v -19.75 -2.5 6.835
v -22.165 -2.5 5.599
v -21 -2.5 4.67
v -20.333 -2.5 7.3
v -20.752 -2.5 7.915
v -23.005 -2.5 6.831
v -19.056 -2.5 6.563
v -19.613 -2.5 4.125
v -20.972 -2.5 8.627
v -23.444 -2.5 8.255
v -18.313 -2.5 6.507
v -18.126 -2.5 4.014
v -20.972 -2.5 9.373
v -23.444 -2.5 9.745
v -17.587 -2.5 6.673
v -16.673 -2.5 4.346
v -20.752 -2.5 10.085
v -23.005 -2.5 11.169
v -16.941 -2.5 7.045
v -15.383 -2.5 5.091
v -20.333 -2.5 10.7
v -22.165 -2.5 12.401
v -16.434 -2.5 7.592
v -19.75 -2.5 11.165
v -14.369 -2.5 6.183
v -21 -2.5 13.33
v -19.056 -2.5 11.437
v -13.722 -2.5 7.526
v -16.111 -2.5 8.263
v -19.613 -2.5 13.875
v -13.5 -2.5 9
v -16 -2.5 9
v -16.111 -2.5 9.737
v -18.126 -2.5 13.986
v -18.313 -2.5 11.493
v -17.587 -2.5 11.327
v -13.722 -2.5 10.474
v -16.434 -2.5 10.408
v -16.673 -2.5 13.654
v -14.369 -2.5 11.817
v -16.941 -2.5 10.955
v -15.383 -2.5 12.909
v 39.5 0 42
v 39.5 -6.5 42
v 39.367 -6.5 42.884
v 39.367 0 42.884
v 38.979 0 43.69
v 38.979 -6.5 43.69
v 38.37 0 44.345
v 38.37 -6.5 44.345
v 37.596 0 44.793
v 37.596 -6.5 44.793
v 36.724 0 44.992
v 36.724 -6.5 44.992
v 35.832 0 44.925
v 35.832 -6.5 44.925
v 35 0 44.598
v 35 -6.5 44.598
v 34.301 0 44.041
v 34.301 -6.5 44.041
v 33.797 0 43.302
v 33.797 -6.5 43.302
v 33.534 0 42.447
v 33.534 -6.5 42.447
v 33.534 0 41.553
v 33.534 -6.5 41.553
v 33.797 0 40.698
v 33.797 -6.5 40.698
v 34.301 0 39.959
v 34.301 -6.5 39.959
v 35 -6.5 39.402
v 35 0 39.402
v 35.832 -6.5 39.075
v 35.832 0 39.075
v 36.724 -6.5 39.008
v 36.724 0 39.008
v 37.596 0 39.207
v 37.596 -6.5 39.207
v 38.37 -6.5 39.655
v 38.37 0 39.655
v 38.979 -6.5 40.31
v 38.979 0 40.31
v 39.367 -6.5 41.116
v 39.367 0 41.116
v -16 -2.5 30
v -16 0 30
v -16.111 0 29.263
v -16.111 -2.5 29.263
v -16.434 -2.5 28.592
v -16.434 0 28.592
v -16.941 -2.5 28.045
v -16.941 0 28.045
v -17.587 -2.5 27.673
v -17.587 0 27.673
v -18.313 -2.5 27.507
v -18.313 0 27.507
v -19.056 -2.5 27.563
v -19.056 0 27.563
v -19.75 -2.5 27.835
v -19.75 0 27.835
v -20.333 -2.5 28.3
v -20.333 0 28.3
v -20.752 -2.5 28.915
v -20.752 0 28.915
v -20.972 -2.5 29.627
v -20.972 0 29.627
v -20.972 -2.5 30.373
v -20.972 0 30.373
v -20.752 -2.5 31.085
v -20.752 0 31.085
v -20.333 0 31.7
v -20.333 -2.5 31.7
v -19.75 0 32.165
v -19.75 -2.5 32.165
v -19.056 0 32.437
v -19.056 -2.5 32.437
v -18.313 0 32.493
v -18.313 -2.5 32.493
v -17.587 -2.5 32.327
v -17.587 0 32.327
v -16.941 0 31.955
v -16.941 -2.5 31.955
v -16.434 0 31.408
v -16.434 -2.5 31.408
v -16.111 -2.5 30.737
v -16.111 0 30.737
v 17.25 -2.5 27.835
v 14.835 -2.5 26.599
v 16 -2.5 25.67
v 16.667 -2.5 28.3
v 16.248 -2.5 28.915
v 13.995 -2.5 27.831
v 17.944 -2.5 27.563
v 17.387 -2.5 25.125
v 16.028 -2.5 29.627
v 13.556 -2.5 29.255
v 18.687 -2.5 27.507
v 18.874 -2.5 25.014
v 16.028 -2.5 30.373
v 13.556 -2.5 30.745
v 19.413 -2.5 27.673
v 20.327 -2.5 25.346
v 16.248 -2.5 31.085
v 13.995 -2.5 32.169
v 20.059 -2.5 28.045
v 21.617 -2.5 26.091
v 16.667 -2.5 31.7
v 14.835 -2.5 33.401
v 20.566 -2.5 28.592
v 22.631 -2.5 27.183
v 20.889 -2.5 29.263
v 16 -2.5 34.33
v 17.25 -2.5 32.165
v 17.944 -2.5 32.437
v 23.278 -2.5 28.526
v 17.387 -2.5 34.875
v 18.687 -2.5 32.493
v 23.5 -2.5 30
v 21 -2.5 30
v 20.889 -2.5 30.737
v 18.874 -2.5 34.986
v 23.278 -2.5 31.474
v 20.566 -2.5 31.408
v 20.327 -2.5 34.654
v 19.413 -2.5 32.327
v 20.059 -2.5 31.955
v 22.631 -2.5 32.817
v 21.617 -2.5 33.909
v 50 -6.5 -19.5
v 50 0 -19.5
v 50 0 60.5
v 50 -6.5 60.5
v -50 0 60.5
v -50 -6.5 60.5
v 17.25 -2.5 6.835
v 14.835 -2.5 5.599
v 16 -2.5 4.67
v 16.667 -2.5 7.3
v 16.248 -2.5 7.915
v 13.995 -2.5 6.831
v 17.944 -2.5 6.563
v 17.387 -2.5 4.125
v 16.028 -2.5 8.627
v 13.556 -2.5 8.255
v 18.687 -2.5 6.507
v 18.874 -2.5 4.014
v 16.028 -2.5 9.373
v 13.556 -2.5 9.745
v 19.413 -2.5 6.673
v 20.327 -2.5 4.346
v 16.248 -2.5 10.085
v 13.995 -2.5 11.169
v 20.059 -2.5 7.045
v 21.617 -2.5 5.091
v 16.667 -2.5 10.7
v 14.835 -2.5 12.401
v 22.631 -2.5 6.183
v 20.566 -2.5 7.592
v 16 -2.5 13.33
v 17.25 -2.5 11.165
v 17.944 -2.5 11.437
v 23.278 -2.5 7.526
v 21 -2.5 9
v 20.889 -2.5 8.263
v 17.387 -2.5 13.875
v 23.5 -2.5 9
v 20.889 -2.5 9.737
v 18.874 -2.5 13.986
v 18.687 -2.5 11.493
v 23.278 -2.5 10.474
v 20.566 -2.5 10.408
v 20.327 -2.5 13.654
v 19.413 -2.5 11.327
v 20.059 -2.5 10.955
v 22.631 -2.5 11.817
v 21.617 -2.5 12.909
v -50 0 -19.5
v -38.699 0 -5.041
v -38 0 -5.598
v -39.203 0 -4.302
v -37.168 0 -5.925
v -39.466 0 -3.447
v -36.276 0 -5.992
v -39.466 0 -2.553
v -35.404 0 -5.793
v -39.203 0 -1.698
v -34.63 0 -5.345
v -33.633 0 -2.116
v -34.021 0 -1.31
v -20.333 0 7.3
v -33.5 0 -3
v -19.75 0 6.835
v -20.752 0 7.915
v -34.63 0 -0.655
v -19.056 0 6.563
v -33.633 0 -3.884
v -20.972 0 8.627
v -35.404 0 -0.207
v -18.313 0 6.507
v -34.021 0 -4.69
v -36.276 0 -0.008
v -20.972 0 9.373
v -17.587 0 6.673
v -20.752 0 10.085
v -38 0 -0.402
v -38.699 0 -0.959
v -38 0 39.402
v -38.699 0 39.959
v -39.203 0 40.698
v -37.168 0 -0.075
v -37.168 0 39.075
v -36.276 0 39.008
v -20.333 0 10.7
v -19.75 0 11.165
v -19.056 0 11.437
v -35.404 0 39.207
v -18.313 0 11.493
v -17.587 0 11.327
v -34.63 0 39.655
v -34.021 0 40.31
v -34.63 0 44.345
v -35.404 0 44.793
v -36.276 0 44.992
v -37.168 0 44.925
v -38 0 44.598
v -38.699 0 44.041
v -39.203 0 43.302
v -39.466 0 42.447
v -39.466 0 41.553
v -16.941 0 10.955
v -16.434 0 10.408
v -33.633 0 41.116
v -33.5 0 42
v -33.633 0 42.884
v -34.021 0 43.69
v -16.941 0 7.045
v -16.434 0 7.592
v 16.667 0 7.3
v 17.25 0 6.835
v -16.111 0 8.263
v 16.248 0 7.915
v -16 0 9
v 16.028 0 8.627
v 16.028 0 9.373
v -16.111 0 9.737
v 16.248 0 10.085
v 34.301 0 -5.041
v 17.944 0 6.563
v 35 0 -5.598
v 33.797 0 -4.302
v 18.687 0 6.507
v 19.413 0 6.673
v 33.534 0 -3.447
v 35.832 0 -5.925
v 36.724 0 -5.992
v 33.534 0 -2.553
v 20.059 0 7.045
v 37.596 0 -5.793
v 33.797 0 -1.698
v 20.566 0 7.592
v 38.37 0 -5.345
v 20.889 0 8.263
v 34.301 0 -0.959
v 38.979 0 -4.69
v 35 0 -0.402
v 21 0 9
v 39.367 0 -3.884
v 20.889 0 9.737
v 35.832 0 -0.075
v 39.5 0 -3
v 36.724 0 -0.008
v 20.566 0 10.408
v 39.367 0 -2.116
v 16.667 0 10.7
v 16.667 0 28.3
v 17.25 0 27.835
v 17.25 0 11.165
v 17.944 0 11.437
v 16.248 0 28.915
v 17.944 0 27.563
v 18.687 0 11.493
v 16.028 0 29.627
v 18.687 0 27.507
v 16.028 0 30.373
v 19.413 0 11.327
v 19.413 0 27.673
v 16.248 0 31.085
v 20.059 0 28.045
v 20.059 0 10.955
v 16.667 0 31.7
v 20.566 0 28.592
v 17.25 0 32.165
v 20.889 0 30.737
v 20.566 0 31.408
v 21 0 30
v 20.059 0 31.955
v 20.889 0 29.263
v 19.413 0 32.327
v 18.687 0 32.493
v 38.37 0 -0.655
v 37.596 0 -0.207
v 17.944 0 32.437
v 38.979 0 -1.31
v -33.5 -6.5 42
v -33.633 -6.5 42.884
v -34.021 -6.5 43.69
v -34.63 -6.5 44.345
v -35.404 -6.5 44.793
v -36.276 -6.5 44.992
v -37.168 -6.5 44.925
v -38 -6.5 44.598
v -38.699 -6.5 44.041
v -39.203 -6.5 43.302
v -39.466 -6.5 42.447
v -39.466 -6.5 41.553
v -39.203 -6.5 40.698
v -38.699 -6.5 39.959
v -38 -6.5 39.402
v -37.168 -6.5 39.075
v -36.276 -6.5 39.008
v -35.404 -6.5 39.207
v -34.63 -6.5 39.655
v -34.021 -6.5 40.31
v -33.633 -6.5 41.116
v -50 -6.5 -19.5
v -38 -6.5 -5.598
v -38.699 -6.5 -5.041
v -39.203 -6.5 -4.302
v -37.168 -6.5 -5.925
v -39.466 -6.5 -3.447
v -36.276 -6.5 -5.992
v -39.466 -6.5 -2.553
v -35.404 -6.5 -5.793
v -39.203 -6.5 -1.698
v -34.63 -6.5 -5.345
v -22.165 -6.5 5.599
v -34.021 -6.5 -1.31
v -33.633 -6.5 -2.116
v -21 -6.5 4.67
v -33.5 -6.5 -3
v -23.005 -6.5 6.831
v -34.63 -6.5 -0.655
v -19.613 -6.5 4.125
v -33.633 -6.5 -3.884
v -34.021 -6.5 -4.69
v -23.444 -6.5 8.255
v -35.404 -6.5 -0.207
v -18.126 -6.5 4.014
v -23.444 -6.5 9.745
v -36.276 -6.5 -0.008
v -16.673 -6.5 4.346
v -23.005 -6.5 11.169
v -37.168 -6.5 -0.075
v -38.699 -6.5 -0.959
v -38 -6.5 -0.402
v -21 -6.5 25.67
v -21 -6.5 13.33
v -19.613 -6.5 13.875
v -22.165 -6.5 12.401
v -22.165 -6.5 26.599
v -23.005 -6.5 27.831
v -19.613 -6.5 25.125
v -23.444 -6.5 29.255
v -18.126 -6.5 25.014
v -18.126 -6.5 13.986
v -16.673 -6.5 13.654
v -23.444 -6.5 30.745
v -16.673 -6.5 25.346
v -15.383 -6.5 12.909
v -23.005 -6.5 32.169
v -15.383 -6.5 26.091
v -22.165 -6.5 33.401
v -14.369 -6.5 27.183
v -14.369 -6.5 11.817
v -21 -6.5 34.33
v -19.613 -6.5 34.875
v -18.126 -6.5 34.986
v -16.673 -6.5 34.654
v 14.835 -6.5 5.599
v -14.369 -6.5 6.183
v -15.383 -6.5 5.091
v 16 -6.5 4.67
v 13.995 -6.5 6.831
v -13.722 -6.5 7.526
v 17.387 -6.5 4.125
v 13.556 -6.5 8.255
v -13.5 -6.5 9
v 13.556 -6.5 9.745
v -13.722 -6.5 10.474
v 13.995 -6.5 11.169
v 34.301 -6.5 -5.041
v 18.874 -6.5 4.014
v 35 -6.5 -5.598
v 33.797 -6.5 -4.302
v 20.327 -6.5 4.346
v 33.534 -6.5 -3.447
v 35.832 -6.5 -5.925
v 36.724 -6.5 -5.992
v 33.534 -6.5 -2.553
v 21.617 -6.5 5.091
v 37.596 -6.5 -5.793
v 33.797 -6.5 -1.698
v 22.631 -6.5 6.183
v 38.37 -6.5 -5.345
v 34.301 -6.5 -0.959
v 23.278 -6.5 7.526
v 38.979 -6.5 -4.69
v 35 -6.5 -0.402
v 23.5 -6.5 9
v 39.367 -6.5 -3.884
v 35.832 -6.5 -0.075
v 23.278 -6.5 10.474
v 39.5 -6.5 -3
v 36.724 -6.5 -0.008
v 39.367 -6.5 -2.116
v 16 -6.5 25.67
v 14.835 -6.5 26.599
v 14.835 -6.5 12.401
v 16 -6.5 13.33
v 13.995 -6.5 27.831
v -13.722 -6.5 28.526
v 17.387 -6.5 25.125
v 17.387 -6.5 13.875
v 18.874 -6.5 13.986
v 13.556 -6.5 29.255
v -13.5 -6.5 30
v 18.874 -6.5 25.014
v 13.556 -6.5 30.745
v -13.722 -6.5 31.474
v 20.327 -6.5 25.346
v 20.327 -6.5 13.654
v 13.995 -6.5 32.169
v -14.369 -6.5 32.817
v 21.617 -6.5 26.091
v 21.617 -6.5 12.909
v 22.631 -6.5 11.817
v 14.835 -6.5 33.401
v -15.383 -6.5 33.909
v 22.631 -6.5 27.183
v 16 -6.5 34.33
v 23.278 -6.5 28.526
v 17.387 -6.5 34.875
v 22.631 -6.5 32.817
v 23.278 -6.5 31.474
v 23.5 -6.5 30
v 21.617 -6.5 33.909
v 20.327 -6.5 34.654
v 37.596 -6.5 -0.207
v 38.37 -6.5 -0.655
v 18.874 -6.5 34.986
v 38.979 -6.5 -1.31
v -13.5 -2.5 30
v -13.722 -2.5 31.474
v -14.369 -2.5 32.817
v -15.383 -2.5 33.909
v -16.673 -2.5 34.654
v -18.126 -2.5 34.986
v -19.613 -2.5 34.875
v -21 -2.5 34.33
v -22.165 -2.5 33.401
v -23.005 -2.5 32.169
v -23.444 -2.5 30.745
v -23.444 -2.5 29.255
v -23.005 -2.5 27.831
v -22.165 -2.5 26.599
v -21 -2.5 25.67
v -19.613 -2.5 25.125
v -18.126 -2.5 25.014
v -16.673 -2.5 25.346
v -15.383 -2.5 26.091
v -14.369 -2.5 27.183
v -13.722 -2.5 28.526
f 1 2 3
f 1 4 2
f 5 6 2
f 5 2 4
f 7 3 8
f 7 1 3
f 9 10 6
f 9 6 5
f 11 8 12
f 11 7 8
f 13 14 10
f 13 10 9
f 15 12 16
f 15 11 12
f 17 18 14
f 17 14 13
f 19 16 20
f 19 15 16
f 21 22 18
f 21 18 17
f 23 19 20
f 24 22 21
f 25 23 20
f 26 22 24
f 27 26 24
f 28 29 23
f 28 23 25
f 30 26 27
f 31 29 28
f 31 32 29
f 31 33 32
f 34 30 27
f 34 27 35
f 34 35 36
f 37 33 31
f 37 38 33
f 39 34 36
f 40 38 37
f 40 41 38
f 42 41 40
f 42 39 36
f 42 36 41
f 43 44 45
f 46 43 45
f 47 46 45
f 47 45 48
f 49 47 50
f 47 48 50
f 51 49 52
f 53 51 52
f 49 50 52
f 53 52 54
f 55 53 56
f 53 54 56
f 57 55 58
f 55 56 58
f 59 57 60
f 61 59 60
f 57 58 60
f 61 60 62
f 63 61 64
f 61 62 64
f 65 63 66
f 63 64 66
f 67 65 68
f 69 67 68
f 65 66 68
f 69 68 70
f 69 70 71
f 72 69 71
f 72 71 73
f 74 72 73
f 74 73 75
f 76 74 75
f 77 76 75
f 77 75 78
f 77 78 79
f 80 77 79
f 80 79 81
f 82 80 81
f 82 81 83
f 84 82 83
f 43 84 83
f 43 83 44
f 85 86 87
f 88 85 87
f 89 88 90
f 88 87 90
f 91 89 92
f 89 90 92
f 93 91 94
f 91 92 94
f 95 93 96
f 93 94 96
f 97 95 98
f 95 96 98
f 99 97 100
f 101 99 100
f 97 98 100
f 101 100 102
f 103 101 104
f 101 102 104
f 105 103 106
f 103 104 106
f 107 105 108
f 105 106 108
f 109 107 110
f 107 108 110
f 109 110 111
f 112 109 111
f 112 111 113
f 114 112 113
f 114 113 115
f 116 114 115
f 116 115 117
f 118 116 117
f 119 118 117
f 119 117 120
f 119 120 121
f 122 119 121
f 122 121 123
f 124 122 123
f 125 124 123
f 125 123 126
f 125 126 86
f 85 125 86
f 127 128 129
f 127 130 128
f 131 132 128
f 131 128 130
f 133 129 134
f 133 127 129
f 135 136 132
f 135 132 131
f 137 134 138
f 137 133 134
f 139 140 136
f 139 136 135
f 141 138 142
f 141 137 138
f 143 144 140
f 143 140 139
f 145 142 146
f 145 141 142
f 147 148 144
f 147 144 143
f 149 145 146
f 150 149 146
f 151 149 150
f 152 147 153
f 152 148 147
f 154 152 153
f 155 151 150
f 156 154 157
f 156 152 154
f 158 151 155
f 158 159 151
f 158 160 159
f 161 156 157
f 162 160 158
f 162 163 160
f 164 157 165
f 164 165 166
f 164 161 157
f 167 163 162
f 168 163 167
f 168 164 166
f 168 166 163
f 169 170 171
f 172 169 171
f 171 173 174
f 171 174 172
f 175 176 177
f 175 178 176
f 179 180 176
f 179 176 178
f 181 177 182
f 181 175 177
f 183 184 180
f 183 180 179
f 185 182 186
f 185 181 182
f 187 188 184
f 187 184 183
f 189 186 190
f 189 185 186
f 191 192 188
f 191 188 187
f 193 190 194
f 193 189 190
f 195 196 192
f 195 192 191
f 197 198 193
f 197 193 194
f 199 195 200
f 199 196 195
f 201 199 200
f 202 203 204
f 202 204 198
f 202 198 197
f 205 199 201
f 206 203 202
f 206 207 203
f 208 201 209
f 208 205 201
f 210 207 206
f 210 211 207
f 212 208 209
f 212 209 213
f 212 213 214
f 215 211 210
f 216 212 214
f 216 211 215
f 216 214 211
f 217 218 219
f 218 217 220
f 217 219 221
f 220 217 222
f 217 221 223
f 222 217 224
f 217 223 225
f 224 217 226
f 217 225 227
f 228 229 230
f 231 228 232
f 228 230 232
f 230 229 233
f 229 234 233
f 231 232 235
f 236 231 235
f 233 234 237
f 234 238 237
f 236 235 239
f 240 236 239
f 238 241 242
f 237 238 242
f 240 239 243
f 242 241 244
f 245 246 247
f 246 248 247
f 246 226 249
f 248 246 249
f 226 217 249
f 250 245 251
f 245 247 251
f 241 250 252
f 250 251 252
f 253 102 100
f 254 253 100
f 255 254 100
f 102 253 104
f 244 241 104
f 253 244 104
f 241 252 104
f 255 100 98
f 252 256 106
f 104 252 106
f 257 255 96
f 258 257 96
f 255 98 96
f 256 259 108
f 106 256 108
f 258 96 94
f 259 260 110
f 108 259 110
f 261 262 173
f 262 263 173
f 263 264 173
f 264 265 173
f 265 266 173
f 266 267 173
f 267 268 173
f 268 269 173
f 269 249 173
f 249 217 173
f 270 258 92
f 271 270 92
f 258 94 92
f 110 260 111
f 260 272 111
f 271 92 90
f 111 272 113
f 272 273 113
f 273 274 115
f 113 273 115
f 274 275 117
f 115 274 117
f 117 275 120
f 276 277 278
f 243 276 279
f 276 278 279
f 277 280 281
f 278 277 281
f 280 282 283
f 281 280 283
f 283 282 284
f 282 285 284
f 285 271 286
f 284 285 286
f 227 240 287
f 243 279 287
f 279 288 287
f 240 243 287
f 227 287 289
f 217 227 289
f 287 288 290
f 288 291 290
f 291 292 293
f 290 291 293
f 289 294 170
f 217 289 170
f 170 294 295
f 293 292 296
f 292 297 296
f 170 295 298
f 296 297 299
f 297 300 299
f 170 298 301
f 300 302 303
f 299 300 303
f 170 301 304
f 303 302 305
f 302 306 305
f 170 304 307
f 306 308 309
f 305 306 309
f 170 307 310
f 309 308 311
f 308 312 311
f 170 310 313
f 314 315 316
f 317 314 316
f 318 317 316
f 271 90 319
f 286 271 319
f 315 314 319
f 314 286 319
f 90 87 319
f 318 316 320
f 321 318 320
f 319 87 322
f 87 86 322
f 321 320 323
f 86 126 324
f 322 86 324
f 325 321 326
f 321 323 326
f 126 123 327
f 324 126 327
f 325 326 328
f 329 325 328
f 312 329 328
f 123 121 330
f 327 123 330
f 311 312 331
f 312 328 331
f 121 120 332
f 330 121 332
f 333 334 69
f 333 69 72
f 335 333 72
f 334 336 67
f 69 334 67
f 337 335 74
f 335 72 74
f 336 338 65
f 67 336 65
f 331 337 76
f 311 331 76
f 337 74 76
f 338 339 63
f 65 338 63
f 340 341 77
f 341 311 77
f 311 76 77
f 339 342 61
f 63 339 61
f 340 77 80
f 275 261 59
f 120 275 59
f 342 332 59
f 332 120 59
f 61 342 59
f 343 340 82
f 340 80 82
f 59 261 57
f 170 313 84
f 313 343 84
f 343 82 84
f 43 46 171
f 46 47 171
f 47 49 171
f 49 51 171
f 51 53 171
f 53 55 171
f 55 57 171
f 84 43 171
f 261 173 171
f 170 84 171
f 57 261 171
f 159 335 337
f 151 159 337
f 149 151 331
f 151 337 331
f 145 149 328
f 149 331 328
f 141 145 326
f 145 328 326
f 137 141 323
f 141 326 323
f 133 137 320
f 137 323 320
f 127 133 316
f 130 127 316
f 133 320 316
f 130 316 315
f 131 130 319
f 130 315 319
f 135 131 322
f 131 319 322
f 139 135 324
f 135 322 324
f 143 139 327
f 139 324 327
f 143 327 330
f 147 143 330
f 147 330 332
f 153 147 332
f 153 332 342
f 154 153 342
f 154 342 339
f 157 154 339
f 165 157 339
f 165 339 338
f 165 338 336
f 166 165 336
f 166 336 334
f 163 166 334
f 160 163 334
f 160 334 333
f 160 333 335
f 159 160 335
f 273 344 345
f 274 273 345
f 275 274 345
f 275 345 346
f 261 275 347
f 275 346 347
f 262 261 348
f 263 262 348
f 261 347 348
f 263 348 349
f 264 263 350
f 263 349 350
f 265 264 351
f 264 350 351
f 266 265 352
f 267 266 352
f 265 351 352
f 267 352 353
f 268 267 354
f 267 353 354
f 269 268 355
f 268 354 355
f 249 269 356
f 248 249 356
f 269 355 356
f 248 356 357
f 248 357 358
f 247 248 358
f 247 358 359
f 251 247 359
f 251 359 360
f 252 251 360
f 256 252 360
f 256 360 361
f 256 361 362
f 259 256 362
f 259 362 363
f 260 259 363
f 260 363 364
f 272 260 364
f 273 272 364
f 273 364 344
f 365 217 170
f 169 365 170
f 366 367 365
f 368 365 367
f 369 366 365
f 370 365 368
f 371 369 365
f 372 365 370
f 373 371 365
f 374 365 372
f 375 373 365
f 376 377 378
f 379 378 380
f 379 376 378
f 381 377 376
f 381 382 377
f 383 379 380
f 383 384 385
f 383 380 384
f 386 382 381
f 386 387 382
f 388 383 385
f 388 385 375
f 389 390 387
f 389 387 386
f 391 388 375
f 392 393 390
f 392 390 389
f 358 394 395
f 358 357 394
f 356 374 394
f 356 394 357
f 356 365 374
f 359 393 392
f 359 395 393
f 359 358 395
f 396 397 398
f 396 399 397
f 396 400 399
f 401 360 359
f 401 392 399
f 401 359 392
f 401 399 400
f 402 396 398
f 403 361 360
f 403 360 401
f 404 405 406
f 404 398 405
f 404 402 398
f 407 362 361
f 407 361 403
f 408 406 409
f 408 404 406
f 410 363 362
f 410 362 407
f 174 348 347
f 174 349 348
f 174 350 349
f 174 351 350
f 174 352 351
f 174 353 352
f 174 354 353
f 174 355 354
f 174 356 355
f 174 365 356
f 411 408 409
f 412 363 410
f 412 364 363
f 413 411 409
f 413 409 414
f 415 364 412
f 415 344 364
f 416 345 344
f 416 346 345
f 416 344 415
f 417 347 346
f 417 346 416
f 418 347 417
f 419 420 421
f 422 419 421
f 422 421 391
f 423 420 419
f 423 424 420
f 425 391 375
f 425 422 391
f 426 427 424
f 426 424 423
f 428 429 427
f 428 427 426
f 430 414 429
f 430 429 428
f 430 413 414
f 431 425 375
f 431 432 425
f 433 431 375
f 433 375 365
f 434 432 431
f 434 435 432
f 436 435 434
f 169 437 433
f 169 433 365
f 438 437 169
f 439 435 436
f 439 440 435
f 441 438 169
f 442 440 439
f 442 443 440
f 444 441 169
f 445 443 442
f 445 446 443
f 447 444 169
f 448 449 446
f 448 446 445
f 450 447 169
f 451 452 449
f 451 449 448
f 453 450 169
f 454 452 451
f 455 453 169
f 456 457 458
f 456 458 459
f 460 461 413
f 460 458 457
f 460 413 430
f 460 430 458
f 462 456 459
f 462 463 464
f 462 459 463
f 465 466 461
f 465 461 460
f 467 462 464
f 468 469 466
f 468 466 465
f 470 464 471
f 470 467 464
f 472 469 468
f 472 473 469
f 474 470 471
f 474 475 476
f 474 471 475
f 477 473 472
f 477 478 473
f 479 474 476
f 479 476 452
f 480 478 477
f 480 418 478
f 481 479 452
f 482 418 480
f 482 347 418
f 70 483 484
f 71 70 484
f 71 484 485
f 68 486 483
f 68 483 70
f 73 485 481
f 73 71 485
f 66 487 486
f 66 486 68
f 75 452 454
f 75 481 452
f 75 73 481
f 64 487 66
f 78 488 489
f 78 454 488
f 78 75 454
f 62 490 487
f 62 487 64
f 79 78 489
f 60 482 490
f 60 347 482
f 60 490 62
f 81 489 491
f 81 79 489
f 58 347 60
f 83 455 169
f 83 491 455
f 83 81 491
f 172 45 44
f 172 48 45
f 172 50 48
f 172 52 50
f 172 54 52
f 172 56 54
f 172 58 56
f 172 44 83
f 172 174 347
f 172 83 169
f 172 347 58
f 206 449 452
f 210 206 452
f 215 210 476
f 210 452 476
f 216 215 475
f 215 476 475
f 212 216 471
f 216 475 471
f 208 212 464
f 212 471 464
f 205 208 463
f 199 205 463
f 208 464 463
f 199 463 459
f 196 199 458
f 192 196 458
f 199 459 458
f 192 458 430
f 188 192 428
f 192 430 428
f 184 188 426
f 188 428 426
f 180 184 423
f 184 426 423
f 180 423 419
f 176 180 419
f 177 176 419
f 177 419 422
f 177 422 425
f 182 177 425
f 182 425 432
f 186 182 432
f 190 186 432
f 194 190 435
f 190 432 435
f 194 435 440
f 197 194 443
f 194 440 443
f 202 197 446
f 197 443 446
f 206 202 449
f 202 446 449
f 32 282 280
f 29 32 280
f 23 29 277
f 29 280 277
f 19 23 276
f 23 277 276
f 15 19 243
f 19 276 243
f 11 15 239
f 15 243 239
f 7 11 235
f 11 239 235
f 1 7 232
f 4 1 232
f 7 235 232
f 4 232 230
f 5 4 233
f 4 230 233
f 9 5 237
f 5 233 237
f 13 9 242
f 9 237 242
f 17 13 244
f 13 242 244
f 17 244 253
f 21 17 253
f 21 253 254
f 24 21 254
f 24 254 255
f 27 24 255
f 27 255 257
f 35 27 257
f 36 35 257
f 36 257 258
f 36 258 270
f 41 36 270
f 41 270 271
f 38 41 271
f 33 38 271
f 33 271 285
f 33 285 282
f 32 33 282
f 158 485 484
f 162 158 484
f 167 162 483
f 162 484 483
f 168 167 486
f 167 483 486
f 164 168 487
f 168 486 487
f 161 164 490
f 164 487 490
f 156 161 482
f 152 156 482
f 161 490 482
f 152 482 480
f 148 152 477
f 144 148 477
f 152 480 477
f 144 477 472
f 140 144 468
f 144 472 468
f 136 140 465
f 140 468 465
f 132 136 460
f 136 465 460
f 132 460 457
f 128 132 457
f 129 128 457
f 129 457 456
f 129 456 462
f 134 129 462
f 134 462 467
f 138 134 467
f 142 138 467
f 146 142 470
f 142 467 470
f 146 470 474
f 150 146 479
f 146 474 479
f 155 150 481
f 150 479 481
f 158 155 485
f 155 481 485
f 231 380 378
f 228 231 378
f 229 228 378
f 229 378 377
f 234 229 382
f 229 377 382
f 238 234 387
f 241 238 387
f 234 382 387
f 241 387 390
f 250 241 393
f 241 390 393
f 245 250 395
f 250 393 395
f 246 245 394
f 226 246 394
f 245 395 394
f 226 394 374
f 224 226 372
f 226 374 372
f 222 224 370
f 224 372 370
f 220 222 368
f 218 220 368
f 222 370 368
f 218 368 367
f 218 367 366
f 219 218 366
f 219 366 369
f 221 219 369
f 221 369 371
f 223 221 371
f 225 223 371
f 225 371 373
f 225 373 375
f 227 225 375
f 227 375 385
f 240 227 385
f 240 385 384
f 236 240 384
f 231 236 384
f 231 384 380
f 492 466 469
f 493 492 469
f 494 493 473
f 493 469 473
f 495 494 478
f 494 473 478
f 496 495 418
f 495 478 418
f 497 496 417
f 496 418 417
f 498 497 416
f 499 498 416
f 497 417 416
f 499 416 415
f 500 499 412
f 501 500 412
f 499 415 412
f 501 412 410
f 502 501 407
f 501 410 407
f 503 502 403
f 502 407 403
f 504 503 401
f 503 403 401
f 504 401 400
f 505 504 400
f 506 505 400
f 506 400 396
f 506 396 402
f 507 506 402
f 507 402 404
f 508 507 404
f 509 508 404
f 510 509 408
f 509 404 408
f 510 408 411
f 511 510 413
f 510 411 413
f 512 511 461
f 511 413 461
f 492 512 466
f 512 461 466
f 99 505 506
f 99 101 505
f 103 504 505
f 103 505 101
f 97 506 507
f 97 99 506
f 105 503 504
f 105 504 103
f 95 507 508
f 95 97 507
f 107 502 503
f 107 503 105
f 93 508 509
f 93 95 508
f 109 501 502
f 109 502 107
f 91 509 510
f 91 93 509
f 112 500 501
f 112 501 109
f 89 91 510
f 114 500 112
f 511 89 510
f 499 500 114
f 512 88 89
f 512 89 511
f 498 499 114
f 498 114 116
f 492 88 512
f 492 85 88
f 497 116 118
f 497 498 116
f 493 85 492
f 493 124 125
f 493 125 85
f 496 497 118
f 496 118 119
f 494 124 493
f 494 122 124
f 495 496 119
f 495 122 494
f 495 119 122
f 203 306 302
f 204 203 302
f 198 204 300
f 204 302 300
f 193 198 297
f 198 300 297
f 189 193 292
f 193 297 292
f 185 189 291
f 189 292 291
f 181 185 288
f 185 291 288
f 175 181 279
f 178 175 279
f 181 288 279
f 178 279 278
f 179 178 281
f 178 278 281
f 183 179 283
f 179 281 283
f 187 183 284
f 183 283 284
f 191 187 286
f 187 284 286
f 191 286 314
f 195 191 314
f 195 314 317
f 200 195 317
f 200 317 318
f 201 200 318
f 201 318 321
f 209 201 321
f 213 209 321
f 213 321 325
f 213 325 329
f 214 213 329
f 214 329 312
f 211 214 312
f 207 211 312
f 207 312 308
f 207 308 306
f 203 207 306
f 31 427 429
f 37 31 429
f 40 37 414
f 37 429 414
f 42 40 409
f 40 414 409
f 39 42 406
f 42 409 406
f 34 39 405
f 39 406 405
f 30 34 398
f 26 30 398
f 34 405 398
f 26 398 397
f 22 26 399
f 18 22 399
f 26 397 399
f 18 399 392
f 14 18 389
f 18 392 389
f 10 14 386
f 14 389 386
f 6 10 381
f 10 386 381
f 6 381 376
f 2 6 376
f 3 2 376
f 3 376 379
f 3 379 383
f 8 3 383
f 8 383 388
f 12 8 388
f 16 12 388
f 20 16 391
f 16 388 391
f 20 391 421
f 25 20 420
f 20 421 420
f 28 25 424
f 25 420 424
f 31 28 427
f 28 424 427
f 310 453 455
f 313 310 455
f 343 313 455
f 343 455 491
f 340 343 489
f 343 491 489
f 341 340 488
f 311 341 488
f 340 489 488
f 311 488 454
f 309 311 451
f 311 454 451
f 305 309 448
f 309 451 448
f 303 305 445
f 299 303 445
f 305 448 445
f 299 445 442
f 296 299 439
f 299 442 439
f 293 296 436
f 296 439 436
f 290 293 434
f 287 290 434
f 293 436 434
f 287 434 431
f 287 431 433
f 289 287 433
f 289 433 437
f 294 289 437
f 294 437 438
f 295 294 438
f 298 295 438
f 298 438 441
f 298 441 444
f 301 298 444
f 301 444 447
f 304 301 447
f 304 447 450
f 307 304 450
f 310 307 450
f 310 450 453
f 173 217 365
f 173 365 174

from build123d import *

# Parameters (mm, degrees)
SKETCH001_W     = 100
SKETCH001_H     = 80
PAD_DEPTH       = 6.5
SKETCH004_R     = 2.5
POCKET_DEPTH    = 10
SKETCH_R        = 5
POCKET001_DEPTH = 4
SKETCH005_R     = 3
POCKET002_DEPTH = 10


with BuildPart() as part:
    # Sketch001 → Pad (new body)
    with BuildSketch(Plane.XZ):
        with Locations((0, 20.5)):
            Rectangle(SKETCH001_W, SKETCH001_H)
    extrude(amount=PAD_DEPTH)

    # Sketch004 → Pocket (cut)
    with BuildSketch(Plane(origin=(0, 0, 0), x_dir=(1, 0, 0), z_dir=(0, 1, 0))):
        with Locations((-18.5, -9)):
            Circle(SKETCH004_R)
        with Locations((18.5, -9)):
            Circle(SKETCH004_R)
        with Locations((-18.5, -30)):
            Circle(SKETCH004_R)
        with Locations((18.5, -30)):
            Circle(SKETCH004_R)
    extrude(amount=-POCKET_DEPTH, mode=Mode.SUBTRACT)

    # Sketch → Pocket001 (cut)
    with BuildSketch(Plane.XZ.offset(6.5)):
        with Locations((18.5, 9)):
            Circle(SKETCH_R)
        with Locations((18.5, 30)):
            Circle(SKETCH_R)
        with Locations((-18.5, 9)):
            Circle(SKETCH_R)
        with Locations((-18.5, 30)):
            Circle(SKETCH_R)
    extrude(amount=-POCKET001_DEPTH, mode=Mode.SUBTRACT)

    # Sketch005 → Pocket002 (cut)
    with BuildSketch(Plane.XZ.offset(6.5)):
        with Locations((36.5, -3)):
            Circle(SKETCH005_R)
        with Locations((36.5, 42)):
            Circle(SKETCH005_R)
        with Locations((-36.5, -3)):
            Circle(SKETCH005_R)
        with Locations((-36.5, 42)):
            Circle(SKETCH005_R)
    extrude(amount=-POCKET002_DEPTH, mode=Mode.SUBTRACT)


solid = part.part
